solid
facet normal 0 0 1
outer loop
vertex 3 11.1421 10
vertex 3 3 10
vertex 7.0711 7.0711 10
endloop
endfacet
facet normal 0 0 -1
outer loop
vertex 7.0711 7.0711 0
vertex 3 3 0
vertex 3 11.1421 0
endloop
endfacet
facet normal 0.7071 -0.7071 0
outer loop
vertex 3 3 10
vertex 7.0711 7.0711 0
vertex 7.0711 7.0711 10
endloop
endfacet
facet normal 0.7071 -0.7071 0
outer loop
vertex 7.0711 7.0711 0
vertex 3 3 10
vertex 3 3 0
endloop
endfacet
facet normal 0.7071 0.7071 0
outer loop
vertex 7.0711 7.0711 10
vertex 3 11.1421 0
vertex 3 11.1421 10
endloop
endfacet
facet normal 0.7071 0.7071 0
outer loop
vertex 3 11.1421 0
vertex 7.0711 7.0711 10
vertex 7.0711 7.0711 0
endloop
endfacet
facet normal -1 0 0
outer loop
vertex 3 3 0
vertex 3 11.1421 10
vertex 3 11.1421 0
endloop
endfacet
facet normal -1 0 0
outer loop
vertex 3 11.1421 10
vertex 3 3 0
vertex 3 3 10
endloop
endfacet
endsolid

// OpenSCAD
//
// Bug description: The intersection results in an empty object.
// Cause: The rotated bounding box is wrongly calculated, yielding a
// box which don't overlap with the bounding box of the second object.
//
intersection() {
  rotate(45) cube(10);
  translate([3,2,0]) cube(10);
}
